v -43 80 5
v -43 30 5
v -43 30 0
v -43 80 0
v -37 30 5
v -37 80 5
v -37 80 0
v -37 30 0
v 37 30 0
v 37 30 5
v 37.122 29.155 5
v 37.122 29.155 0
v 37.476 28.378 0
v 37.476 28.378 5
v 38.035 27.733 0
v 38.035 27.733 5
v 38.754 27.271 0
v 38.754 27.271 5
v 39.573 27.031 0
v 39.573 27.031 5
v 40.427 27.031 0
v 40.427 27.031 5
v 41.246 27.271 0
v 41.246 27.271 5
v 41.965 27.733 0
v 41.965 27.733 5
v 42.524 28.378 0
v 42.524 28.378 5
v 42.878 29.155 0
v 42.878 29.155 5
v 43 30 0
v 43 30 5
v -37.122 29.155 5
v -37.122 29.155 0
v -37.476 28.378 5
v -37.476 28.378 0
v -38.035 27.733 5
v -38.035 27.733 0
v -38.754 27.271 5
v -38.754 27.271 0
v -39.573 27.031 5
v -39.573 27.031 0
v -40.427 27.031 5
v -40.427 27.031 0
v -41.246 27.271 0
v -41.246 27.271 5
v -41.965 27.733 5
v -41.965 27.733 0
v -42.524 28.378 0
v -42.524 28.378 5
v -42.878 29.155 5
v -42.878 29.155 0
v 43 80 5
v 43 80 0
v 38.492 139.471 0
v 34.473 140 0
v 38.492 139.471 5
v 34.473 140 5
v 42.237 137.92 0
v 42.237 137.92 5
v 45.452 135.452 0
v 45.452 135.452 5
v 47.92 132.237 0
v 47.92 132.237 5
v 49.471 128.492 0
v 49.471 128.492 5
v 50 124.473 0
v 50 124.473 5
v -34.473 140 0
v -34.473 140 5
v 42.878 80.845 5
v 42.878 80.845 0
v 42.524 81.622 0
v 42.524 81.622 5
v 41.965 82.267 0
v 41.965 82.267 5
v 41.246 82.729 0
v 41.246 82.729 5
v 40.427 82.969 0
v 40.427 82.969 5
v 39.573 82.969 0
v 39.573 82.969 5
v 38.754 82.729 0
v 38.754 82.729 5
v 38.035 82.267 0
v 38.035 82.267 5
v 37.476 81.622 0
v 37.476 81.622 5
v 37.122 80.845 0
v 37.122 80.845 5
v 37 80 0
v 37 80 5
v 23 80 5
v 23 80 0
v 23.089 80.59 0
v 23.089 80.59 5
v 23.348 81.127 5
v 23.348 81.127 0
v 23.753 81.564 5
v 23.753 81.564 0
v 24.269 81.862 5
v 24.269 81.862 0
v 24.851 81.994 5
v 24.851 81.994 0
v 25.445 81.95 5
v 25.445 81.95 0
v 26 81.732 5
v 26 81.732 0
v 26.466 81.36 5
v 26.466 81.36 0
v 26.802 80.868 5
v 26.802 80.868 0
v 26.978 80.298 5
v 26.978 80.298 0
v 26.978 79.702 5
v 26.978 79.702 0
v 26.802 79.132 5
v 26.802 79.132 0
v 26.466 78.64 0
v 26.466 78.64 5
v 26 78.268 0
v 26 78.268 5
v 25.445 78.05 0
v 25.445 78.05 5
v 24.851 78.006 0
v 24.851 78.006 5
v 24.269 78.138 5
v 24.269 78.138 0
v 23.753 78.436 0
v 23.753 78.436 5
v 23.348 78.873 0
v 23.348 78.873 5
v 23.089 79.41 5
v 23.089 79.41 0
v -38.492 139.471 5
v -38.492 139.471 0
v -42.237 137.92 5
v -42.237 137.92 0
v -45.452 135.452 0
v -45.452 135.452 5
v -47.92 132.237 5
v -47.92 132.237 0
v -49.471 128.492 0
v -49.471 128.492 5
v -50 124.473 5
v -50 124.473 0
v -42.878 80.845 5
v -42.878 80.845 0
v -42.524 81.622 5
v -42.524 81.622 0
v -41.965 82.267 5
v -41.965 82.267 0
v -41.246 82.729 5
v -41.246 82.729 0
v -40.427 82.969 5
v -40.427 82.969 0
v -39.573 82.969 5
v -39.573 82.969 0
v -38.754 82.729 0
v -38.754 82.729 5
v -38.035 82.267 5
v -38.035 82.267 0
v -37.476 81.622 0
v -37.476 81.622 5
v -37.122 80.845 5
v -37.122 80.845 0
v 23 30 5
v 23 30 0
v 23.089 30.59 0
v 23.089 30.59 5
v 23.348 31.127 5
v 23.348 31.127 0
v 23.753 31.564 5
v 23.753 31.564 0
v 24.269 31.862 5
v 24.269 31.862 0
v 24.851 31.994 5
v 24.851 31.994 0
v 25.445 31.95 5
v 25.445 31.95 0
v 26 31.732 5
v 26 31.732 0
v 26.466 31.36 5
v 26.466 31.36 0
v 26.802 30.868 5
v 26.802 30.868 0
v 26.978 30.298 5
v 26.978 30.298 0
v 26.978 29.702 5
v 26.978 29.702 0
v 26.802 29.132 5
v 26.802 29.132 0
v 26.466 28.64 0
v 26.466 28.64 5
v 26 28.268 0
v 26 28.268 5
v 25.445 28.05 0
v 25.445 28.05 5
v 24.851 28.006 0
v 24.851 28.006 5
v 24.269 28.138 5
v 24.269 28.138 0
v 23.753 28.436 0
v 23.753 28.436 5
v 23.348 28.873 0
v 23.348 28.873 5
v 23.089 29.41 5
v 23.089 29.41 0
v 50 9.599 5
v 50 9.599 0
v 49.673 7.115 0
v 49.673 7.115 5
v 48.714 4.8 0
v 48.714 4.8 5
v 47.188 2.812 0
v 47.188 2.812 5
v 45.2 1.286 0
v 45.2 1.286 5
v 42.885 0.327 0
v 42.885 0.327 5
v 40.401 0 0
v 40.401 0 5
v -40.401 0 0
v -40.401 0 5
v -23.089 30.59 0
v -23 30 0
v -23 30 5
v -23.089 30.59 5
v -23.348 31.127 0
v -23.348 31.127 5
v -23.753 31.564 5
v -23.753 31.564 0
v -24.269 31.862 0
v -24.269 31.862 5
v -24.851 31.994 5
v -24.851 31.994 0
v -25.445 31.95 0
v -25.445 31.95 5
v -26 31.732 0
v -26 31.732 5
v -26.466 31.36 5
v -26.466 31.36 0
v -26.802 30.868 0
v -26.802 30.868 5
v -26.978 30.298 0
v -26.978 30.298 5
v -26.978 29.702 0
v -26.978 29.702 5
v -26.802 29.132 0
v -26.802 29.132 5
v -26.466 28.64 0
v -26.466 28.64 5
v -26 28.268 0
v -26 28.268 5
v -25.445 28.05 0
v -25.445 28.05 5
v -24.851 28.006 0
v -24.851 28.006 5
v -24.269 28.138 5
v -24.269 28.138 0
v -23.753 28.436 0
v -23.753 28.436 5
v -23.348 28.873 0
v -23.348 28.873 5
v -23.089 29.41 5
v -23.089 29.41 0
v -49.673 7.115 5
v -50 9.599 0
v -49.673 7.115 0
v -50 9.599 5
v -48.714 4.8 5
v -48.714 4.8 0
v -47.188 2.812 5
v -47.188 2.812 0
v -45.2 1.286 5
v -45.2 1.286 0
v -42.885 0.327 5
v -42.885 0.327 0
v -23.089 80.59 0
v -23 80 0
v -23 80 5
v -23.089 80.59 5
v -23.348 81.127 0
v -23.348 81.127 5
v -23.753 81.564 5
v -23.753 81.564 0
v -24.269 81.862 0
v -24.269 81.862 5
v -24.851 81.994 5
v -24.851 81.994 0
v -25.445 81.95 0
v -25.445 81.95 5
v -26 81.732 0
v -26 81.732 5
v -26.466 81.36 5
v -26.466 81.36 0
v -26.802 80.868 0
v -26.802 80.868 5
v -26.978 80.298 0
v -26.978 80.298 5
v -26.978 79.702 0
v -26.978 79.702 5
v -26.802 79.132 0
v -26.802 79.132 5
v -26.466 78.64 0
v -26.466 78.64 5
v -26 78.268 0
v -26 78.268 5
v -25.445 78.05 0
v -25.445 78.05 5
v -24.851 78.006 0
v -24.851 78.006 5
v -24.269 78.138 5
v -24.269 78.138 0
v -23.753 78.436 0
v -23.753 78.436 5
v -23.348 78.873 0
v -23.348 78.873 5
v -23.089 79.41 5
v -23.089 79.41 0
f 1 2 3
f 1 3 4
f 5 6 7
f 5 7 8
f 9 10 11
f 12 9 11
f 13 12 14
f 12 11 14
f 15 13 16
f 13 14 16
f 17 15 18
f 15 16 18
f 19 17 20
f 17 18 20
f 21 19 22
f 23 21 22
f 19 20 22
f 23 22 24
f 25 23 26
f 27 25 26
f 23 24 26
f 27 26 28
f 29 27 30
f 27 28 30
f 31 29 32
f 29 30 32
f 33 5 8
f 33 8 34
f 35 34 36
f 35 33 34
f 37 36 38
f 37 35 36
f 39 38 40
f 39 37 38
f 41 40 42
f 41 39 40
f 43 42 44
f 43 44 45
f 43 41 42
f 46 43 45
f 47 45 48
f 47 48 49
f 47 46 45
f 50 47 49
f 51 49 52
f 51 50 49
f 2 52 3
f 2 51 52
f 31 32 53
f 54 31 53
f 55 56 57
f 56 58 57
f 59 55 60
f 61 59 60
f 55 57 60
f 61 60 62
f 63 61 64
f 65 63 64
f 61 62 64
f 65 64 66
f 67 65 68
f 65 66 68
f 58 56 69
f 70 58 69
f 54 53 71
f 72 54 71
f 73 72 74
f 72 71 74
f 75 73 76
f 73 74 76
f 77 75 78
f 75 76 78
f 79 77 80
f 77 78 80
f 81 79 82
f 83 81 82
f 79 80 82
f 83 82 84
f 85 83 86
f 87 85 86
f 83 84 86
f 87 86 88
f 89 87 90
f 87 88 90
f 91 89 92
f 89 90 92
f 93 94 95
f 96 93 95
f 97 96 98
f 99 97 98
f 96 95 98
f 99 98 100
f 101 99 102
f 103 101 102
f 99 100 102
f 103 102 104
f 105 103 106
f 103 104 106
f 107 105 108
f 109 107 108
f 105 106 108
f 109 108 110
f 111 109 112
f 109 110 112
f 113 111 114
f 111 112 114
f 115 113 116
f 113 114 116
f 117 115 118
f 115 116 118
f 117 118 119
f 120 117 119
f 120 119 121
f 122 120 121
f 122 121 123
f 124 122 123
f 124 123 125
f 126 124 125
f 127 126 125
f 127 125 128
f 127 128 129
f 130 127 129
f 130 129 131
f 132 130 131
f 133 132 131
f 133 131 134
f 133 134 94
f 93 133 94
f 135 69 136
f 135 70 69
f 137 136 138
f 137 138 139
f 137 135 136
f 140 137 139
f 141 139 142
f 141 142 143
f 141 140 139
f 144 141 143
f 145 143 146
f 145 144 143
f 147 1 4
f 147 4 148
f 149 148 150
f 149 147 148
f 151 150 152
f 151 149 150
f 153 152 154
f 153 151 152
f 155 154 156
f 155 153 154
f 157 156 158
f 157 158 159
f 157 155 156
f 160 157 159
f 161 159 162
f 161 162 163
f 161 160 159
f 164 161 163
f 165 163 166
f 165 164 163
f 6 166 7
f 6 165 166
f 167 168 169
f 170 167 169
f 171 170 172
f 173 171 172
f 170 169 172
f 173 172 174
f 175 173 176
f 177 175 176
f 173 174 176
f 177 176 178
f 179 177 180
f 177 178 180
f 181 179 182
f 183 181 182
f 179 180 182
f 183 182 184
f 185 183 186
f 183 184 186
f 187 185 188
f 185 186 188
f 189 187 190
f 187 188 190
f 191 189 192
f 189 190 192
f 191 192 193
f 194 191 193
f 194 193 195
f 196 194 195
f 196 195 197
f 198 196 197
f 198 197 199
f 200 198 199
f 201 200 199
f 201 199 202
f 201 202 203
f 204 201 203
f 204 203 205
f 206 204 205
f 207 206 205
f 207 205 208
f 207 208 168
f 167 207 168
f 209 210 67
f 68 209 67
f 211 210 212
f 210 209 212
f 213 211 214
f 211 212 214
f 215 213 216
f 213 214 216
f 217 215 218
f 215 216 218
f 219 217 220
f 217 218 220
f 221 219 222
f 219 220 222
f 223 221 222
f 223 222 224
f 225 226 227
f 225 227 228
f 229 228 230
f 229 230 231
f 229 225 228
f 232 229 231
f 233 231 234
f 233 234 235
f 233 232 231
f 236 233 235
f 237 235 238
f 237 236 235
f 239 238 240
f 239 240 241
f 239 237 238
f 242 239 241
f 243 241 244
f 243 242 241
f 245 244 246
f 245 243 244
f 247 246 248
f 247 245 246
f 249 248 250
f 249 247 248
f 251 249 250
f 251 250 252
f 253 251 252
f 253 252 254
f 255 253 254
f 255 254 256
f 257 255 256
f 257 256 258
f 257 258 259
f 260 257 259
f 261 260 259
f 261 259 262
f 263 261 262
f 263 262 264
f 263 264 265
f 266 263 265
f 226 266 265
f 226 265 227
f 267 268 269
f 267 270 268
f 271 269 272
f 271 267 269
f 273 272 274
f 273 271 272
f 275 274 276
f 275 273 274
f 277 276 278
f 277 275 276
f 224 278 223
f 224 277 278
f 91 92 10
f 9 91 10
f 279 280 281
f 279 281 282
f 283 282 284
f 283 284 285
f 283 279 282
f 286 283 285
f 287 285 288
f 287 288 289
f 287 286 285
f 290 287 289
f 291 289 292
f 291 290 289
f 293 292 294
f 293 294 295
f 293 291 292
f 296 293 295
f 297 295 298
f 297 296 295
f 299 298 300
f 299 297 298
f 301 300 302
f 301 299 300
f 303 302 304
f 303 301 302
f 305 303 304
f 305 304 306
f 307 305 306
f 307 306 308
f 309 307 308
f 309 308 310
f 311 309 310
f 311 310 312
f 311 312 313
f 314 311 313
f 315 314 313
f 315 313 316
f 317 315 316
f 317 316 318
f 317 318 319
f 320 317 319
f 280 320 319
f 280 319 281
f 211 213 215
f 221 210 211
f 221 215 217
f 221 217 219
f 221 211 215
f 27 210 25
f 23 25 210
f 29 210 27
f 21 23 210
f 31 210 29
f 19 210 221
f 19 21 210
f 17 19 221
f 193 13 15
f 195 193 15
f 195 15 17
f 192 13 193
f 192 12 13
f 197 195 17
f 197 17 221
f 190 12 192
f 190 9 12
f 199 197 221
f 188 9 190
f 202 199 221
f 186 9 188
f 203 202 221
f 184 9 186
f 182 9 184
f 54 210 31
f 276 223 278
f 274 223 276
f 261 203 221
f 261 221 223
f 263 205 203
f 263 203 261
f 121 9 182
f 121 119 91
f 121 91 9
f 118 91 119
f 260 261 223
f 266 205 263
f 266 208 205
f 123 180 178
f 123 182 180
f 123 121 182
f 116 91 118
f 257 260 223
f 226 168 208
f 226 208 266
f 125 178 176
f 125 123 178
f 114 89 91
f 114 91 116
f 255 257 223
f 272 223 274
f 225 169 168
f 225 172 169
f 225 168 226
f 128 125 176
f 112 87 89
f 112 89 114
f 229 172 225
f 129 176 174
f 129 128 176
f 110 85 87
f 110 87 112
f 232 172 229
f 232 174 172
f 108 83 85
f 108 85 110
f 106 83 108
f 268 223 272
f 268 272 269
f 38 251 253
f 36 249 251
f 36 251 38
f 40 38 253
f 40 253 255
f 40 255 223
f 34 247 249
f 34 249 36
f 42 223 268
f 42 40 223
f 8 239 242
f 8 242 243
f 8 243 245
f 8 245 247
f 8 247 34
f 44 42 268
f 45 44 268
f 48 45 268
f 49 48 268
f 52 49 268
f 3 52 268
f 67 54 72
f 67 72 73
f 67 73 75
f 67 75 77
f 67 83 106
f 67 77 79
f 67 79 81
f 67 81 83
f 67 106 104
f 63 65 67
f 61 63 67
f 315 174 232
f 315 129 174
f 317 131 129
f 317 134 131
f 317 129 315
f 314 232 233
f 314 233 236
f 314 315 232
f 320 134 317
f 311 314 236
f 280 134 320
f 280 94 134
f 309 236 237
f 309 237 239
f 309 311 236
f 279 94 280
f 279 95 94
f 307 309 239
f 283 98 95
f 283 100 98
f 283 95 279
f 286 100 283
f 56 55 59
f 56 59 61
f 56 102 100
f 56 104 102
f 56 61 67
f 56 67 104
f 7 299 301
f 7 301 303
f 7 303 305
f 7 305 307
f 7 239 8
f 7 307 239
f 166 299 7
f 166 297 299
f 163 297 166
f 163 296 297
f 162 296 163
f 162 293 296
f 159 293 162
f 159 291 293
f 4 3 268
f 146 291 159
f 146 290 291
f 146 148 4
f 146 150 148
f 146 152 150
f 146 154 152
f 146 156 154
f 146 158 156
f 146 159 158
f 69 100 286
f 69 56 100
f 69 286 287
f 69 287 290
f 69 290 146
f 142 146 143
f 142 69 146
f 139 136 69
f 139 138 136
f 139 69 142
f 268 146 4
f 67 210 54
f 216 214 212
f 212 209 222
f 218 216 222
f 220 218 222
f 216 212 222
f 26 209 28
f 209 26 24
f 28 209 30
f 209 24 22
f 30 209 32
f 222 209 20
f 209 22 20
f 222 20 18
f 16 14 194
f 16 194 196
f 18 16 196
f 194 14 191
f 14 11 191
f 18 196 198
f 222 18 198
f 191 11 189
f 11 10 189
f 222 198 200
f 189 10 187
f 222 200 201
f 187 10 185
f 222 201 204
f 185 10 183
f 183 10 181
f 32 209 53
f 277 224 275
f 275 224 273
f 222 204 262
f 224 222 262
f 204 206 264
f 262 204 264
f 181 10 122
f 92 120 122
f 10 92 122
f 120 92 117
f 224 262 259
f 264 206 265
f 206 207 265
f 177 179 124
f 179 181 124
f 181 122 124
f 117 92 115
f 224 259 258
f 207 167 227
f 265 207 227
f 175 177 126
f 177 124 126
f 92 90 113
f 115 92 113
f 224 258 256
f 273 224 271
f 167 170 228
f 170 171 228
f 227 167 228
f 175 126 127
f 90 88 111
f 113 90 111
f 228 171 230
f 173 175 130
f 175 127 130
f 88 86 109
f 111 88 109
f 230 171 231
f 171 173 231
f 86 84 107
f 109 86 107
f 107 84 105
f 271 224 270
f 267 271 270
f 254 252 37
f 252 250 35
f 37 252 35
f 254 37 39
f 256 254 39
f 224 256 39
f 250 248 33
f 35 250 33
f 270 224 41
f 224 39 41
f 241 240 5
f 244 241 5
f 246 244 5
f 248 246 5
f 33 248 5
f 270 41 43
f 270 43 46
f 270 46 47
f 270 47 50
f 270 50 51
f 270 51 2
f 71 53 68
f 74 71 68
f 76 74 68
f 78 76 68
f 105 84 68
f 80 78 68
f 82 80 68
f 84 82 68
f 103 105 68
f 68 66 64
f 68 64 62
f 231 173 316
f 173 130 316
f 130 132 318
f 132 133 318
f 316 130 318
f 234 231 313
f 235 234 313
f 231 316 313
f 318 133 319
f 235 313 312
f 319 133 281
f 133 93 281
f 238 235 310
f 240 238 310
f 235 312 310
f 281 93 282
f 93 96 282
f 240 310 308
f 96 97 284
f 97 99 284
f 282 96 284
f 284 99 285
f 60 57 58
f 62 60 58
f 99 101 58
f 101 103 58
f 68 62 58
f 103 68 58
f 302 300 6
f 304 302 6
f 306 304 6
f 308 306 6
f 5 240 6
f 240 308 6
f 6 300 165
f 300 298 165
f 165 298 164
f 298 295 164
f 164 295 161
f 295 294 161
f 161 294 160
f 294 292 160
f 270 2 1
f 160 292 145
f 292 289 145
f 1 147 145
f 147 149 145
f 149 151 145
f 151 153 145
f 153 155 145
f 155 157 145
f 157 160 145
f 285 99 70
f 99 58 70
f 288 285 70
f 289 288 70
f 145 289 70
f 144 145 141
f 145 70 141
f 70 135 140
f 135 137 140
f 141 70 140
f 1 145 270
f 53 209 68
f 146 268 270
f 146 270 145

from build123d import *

# Parameters (mm, degrees)
F0_W     = 50
F0_H     = 140
F1_DEPTH = 5
F3_D     = 4
F6_DEPTH = 25
F7_R     = 15.526878
F8_R     = 9.599373


with BuildPart() as f1:
    # F0 (on Top) → F1 (new body)
    with BuildSketch(Plane.XY):
        with Locations((25, 70)):
            Rectangle(F0_W, F0_H)
    extrude(amount=F1_DEPTH)

    # F3 (through all)
    with Locations(Plane.XY.offset(5)):
        with Locations((25, 30), (25, 80)):
            Hole(F3_D / 2)

    # F5 (on face) → F6 (cut)
    with BuildSketch(Plane.XY.offset(5)):
        with BuildLine():
            ThreePointArc((37, 30), (40, 27), (43, 30))
            Line((43, 30), (43, 80))
            ThreePointArc((43, 80), (40, 83), (37, 80))
            Line((37, 80), (37, 30))
        make_face()
    extrude(amount=-F6_DEPTH, mode=Mode.SUBTRACT)

    # F7
    f7_edges = [f1.edges().sort_by_distance(p)[0] for p in [
        (50, 140, 2.5),
    ]]
    fillet(f7_edges, radius=F7_R)

    # F8
    f8_edges = [f1.edges().sort_by_distance(p)[0] for p in [
        (50, 0, 2.5),
    ]]
    fillet(f8_edges, radius=F8_R)

    # F9: F1 across plane


with BuildPart() as f1_1:
    add(f1.part)
    add(f1.part.mirror(Plane.YZ))


solid = f1_1.part
